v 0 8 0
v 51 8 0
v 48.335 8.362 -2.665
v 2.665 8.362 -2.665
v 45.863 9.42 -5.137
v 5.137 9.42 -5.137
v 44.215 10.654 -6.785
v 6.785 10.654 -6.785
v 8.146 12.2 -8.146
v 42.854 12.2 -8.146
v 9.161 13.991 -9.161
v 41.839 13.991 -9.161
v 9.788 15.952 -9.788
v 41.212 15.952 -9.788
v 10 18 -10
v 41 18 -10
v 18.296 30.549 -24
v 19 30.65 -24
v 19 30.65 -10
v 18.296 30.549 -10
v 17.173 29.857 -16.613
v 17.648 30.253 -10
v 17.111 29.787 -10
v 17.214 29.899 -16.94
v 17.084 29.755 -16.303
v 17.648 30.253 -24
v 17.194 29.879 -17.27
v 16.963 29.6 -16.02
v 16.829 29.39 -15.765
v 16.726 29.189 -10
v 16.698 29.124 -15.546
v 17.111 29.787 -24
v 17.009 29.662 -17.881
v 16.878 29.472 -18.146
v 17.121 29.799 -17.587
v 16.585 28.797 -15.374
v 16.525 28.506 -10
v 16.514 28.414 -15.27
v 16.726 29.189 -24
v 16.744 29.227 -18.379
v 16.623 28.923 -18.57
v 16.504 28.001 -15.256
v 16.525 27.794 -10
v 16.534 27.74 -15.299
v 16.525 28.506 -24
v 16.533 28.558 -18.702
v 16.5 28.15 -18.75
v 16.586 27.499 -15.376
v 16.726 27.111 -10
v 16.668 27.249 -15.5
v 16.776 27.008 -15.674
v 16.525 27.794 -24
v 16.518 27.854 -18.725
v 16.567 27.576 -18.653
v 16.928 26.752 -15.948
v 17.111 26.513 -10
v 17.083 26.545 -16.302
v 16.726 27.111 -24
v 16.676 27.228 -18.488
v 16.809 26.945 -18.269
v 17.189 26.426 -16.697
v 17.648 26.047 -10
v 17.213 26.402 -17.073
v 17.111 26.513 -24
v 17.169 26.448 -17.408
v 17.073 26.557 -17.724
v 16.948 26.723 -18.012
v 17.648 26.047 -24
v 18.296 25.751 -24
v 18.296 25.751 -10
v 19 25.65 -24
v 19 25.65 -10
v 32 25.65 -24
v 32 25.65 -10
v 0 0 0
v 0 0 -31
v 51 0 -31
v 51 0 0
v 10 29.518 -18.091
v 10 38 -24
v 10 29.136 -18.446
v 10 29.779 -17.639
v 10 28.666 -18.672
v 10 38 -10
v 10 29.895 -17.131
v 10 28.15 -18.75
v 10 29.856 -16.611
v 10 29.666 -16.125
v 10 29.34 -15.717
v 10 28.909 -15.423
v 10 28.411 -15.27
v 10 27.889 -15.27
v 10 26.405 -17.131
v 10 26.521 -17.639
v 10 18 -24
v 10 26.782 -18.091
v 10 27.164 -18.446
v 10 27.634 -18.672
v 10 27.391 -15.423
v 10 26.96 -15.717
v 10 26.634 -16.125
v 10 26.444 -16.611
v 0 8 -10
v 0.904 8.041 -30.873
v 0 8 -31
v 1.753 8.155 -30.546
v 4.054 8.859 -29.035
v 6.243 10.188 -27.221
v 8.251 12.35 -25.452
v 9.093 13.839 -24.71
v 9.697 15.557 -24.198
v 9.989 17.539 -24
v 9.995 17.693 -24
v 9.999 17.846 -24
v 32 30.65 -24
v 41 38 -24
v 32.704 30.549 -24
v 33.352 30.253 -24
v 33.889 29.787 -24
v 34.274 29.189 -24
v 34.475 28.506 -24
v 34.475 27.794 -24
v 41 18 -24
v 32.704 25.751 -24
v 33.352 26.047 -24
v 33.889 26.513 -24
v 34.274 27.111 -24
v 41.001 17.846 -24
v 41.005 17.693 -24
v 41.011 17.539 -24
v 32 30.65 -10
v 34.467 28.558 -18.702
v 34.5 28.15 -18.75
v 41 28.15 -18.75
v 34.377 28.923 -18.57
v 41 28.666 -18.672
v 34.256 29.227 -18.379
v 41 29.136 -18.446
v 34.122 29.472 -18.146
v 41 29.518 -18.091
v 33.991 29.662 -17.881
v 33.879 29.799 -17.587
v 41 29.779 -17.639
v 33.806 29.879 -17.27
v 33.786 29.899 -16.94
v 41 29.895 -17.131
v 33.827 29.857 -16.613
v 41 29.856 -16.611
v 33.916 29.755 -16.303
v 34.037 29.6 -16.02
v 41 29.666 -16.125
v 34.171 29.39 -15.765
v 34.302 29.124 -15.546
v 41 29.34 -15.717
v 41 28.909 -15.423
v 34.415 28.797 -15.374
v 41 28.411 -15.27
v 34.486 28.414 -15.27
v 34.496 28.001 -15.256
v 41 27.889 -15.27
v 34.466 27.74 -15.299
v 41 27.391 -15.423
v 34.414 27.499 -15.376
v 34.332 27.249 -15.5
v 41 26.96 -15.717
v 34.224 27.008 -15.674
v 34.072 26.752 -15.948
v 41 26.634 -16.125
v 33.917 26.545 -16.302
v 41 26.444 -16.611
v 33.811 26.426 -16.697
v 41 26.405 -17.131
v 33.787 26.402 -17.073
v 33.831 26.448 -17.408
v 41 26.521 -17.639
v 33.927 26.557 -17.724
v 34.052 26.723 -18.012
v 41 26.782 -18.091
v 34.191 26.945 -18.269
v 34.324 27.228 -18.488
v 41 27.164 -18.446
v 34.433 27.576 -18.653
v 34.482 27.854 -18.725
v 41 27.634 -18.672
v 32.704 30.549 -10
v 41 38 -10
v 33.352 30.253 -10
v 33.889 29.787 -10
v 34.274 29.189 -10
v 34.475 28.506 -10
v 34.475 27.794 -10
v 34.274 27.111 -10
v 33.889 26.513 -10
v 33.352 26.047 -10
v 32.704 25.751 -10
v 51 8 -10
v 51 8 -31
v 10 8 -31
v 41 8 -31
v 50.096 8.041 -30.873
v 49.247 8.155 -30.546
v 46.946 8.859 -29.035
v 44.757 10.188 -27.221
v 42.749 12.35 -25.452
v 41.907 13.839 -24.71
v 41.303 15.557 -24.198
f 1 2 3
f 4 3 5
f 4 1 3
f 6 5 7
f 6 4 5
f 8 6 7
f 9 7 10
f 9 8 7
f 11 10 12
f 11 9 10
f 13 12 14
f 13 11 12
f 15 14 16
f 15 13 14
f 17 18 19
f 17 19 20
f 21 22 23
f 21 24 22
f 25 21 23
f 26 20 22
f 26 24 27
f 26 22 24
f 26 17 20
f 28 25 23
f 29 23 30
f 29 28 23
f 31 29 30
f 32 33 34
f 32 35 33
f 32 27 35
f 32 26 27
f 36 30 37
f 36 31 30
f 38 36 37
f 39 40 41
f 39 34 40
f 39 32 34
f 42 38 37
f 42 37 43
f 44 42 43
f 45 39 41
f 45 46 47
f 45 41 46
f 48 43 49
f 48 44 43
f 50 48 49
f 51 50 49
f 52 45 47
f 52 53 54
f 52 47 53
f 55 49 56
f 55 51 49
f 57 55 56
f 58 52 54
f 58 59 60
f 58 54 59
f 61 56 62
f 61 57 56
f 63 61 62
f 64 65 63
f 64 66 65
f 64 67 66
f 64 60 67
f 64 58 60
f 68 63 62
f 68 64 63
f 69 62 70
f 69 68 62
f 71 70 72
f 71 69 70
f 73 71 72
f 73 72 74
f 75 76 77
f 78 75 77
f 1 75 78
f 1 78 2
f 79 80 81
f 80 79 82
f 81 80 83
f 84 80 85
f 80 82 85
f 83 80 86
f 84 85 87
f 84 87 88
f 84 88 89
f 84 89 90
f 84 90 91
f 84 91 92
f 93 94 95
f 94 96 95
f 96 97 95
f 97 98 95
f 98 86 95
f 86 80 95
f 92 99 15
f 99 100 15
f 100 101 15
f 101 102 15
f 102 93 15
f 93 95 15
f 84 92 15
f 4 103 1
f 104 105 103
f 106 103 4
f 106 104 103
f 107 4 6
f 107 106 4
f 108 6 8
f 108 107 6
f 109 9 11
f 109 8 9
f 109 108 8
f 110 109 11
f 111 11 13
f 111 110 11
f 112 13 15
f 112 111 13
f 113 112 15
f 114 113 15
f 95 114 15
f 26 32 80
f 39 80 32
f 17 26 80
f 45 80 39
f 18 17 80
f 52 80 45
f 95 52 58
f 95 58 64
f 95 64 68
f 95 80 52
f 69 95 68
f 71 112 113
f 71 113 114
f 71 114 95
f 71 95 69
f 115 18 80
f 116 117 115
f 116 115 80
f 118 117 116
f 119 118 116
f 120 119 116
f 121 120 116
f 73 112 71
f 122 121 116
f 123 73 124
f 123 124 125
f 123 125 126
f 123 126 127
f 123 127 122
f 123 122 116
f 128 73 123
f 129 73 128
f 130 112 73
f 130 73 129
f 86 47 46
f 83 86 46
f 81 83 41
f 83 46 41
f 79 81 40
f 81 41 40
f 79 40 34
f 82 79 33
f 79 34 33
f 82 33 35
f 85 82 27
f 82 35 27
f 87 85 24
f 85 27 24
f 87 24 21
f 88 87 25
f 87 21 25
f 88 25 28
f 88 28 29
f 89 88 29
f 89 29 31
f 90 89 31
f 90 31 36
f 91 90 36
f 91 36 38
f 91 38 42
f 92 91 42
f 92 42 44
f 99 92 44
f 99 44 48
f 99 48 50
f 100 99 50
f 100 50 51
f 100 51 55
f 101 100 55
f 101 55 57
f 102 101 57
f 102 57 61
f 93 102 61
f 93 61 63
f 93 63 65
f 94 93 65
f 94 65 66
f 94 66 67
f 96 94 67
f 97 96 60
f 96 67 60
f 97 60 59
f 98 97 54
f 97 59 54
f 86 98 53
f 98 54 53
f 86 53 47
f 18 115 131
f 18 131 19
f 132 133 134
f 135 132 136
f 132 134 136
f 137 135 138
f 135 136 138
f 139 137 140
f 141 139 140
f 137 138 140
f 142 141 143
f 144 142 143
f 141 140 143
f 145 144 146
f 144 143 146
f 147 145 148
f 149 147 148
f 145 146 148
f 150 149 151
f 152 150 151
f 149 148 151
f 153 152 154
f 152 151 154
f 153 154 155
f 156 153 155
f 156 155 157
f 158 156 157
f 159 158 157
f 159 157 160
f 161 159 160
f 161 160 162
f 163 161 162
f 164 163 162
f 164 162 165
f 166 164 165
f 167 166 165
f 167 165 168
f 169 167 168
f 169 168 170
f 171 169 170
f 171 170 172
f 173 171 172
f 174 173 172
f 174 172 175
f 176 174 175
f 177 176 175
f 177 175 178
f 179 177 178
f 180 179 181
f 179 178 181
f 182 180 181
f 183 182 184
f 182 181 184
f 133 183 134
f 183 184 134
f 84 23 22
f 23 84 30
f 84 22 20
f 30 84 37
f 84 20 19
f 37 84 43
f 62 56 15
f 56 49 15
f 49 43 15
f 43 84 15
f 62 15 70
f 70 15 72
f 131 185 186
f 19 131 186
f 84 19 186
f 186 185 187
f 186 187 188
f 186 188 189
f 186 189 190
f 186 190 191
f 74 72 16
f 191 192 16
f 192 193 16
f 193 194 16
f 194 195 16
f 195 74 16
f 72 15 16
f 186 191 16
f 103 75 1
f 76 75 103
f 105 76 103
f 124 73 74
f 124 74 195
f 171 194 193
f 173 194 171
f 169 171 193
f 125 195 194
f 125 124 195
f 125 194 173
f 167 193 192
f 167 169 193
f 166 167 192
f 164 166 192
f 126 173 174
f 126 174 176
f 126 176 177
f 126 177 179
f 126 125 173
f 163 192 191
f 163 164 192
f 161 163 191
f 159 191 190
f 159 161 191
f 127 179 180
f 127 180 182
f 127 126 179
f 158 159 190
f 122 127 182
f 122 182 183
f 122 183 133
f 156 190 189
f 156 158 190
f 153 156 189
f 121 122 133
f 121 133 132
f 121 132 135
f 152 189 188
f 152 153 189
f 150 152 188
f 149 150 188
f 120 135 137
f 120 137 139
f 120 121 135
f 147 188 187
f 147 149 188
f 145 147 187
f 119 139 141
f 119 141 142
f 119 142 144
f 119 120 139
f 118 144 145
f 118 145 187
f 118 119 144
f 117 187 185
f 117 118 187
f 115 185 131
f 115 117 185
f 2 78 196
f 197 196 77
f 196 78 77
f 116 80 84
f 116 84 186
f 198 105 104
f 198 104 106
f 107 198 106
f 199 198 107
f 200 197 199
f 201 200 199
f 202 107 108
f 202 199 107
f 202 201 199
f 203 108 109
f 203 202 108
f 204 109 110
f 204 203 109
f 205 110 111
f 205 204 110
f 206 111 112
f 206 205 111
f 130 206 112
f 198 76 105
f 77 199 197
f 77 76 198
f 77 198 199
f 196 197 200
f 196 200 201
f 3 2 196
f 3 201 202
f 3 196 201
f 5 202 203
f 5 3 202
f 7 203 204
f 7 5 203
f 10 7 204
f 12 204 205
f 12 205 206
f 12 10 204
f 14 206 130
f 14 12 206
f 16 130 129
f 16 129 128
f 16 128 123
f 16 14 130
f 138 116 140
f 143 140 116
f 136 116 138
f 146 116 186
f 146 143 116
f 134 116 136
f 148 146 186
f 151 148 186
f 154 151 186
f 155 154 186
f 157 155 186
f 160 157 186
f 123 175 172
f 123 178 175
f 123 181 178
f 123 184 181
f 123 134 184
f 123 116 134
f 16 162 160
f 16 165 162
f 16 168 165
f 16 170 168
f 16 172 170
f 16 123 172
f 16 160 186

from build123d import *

# Parameters (mm, degrees)
SKETCH1_W                               = 51
SKETCH1_H                               = 31
BOSS_EXTRUDE1_DEPTH                     = 8
SKETCH5_W                               = 31
SKETCH5_H                               = 14
BOSS_EXTRUDE3_DEPTH                     = 30
CUT_EXTRUDE3_DEPTH                      = 68.977937597
FILLET1_R                               = 10
SKETCH8_R                               = 1.75
F_3_5MM_SCREW_HOLE_FOR_TENSIONING_DEPTH = 64.921827371


with BuildPart() as part:
    # Sketch1 → Boss-Extrude1 (new body)
    with BuildSketch(Plane(origin=(0, 0, 0), x_dir=(1, 0, 0), z_dir=(0, 1, 0))):
        with Locations((25.5, 15.5)):
            Rectangle(SKETCH1_W, SKETCH1_H)
    extrude(amount=BOSS_EXTRUDE1_DEPTH)

    # Sketch5 → Boss-Extrude3 (add)
    with BuildSketch(Plane(origin=(0, 8, 0), x_dir=(1, 0, 0), z_dir=(0, 1, 0))):
        with Locations((25.5, 17)):
            Rectangle(SKETCH5_W, SKETCH5_H)
    extrude(amount=BOSS_EXTRUDE3_DEPTH)

    # Sketch6 → Cut-Extrude3 (cut, through all)
    with BuildSketch(Plane(origin=(0, 0, -24), x_dir=(-1, 0, 0), z_dir=(0, 0, -1))):
        with BuildLine():
            Line((-32.000000097, 30.65), (-18.999999903, 30.65))
            ThreePointArc((-18.999999903, 30.65), (-16.499999903, 28.15), (-18.999999903, 25.65))
            Line((-18.999999903, 25.65), (-32.000000097, 25.65))
            ThreePointArc((-32.000000097, 25.65), (-34.500000097, 28.15), (-32.000000097, 30.65))
        make_face()
    extrude(amount=-CUT_EXTRUDE3_DEPTH, mode=Mode.SUBTRACT)

    # Fillet1
    # the kernel refuses this fillet: 10 mm, written as the material it adds along each edge
    with BuildSketch(Plane(origin=(41, 8, -24), x_dir=(0, 0, -1), z_dir=(-1, 0, 0))) as fillet1_piece_1:
        with BuildLine():
            CenterArc((10, -9.539392014), FILLET1_R, 107.457603124, 72.542396876)
            Line((0, -9.539392014), (-0.2, -9.539392014))
            Line((-0.2, -9.539392014), (-0.2, 0))
            Line((-0.2, 0), (0, 0.2))
            ThreePointArc((0, 0.2), (3.5, 0.2), (6.94, 0.19078784))
            Line((6.94, 0.19078784), (7, 0))
        make_face()
    extrude(amount=31)
    with BuildSketch(Plane(origin=(10, 8, -24), x_dir=(-1, 0, 0), z_dir=(0, 0, 1)), Plane(origin=(41, 8, -10), x_dir=(1, 0, 0), z_dir=(0, 0, -1))) as fillet1_piece_2:
        with BuildLine():
            CenterArc((FILLET1_R, -FILLET1_R), FILLET1_R, 90, 90)
            Line((0, -FILLET1_R), (-FILLET1_R * 0.02, -FILLET1_R))
            Line((-FILLET1_R * 0.02, -FILLET1_R), (-FILLET1_R * 0.02, FILLET1_R * 0.02))
            Line((-FILLET1_R * 0.02, FILLET1_R * 0.02), (FILLET1_R, FILLET1_R * 0.02))
            Line((FILLET1_R, FILLET1_R * 0.02), (FILLET1_R, 0))
        make_face()
    extrude(amount=14)
    with BuildSketch(Plane(origin=(10, 8, -10), x_dir=(0, 0, 1), z_dir=(1, 0, 0))) as fillet1_piece_3:
        with BuildLine():
            CenterArc((FILLET1_R, -FILLET1_R), FILLET1_R, 90, 90)
            Line((0, -FILLET1_R), (-FILLET1_R * 0.02, -FILLET1_R))
            Line((-FILLET1_R * 0.02, -FILLET1_R), (-FILLET1_R * 0.02, FILLET1_R * 0.02))
            Line((-FILLET1_R * 0.02, FILLET1_R * 0.02), (FILLET1_R, FILLET1_R * 0.02))
            Line((FILLET1_R, FILLET1_R * 0.02), (FILLET1_R, 0))
        make_face()
    extrude(amount=31)
    with BuildSketch(Plane(origin=(64.848480035, 8, -24), x_dir=(0, 0, -1), z_dir=(-1, 0, 0))) as fillet1_piece_4a_section:
        with BuildLine():
            CenterArc((10, -9.539392014), FILLET1_R, 107.457603124, 72.542396876)
            Line((0, -9.539392014), (-0.2, -9.539392014))
            Line((-0.2, -9.539392014), (-0.2, 0))
            Line((-0.2, 0), (0, 0.2))
            ThreePointArc((0, 0.2), (3.5, 0.2), (6.94, 0.19078784))
            Line((6.94, 0.19078784), (7, 0))
        make_face()
    fillet1_piece_4a = extrude(amount=54.848480035, mode=Mode.PRIVATE)
    fillet1_piece_4a = split(fillet1_piece_4a, bisect_by=Plane(origin=(51, 10.271225878, -25.787817996), z_dir=(-1, 0, 0)), keep=Keep.TOP, mode=Mode.PRIVATE)
    fillet1_piece_4a = split(fillet1_piece_4a, bisect_by=Plane(origin=(41, 10.271225878, -25.787817996), z_dir=(1, 0, 0)), keep=Keep.TOP, mode=Mode.PRIVATE)
    with BuildSketch(Plane(origin=(41, 8, -10), x_dir=(1, 0, 0), z_dir=(0, 0, -1))) as fillet1_piece_4b_section:
        with BuildLine():
            CenterArc((FILLET1_R, -FILLET1_R), FILLET1_R, 90, 90)
            Line((0, -FILLET1_R), (-FILLET1_R * 0.02, -FILLET1_R))
            Line((-FILLET1_R * 0.02, -FILLET1_R), (-FILLET1_R * 0.02, FILLET1_R * 0.02))
            Line((-FILLET1_R * 0.02, FILLET1_R * 0.02), (FILLET1_R, FILLET1_R * 0.02))
            Line((FILLET1_R, FILLET1_R * 0.02), (FILLET1_R, 0))
        make_face()
    fillet1_piece_4b = extrude(amount=39, mode=Mode.PRIVATE)
    fillet1_piece_4b = split(fillet1_piece_4b, bisect_by=Plane(origin=(43.263951143, 10.263951143, -31), z_dir=(0, 0, 1)), keep=Keep.TOP, mode=Mode.PRIVATE)
    fillet1_piece_4b = split(fillet1_piece_4b, bisect_by=Plane(origin=(43.263951143, 10.263951143, -24), z_dir=(0, 0, -1)), keep=Keep.TOP, mode=Mode.PRIVATE)
    fillet1_piece_4 = fillet1_piece_4a & fillet1_piece_4b
    add(fillet1_piece_4)
    with BuildSketch(Plane(origin=(41, 8, -24), x_dir=(0, 0, -1), z_dir=(-1, 0, 0))) as fillet1_piece_5a_section:
        with BuildLine():
            CenterArc((10, -9.539392014), FILLET1_R, 107.457603124, 72.542396876)
            Line((0, -9.539392014), (-0.2, -9.539392014))
            Line((-0.2, -9.539392014), (-0.2, 0))
            Line((-0.2, 0), (0, 0.2))
            ThreePointArc((0, 0.2), (3.5, 0.2), (6.94, 0.19078784))
            Line((6.94, 0.19078784), (7, 0))
        make_face()
    fillet1_piece_5a = extrude(amount=54.848480035, mode=Mode.PRIVATE)
    fillet1_piece_5a = split(fillet1_piece_5a, bisect_by=Plane(origin=(0, 10.271225878, -25.787817996), z_dir=(1, 0, 0)), keep=Keep.TOP, mode=Mode.PRIVATE)
    fillet1_piece_5a = split(fillet1_piece_5a, bisect_by=Plane(origin=(10, 10.271225878, -25.787817996), z_dir=(-1, 0, 0)), keep=Keep.TOP, mode=Mode.PRIVATE)
    with BuildSketch(Plane(origin=(10, 8, -49), x_dir=(-1, 0, 0), z_dir=(0, 0, 1))) as fillet1_piece_5b_section:
        with BuildLine():
            CenterArc((FILLET1_R, -FILLET1_R), FILLET1_R, 90, 90)
            Line((0, -FILLET1_R), (-FILLET1_R * 0.02, -FILLET1_R))
            Line((-FILLET1_R * 0.02, -FILLET1_R), (-FILLET1_R * 0.02, FILLET1_R * 0.02))
            Line((-FILLET1_R * 0.02, FILLET1_R * 0.02), (FILLET1_R, FILLET1_R * 0.02))
            Line((FILLET1_R, FILLET1_R * 0.02), (FILLET1_R, 0))
        make_face()
    fillet1_piece_5b = extrude(amount=39, mode=Mode.PRIVATE)
    fillet1_piece_5b = split(fillet1_piece_5b, bisect_by=Plane(origin=(7.736048857, 10.263951143, -31), z_dir=(0, 0, 1)), keep=Keep.TOP, mode=Mode.PRIVATE)
    fillet1_piece_5b = split(fillet1_piece_5b, bisect_by=Plane(origin=(7.736048857, 10.263951143, -24), z_dir=(0, 0, -1)), keep=Keep.TOP, mode=Mode.PRIVATE)
    fillet1_piece_5 = fillet1_piece_5a & fillet1_piece_5b
    add(fillet1_piece_5)
    with BuildSketch(Plane(origin=(10, 8, -24), x_dir=(-1, 0, 0), z_dir=(0, 0, 1))) as fillet1_piece_6a_section:
        with BuildLine():
            CenterArc((FILLET1_R, -FILLET1_R), FILLET1_R, 90, 90)
            Line((0, -FILLET1_R), (-FILLET1_R * 0.02, -FILLET1_R))
            Line((-FILLET1_R * 0.02, -FILLET1_R), (-FILLET1_R * 0.02, FILLET1_R * 0.02))
            Line((-FILLET1_R * 0.02, FILLET1_R * 0.02), (FILLET1_R, FILLET1_R * 0.02))
            Line((FILLET1_R, FILLET1_R * 0.02), (FILLET1_R, 0))
        make_face()
    fillet1_piece_6a = extrude(amount=39, mode=Mode.PRIVATE)
    fillet1_piece_6a = split(fillet1_piece_6a, bisect_by=Plane(origin=(7.736048857, 10.263951143, 0), z_dir=(0, 0, -1)), keep=Keep.TOP, mode=Mode.PRIVATE)
    fillet1_piece_6a = split(fillet1_piece_6a, bisect_by=Plane(origin=(7.736048857, 10.263951143, -10), z_dir=(0, 0, 1)), keep=Keep.TOP, mode=Mode.PRIVATE)
    with BuildSketch(Plane(origin=(-15, 8, -10), x_dir=(0, 0, 1), z_dir=(1, 0, 0))) as fillet1_piece_6b_section:
        with BuildLine():
            CenterArc((FILLET1_R, -FILLET1_R), FILLET1_R, 90, 90)
            Line((0, -FILLET1_R), (-FILLET1_R * 0.02, -FILLET1_R))
            Line((-FILLET1_R * 0.02, -FILLET1_R), (-FILLET1_R * 0.02, FILLET1_R * 0.02))
            Line((-FILLET1_R * 0.02, FILLET1_R * 0.02), (FILLET1_R, FILLET1_R * 0.02))
            Line((FILLET1_R, FILLET1_R * 0.02), (FILLET1_R, 0))
        make_face()
    fillet1_piece_6b = extrude(amount=56, mode=Mode.PRIVATE)
    fillet1_piece_6b = split(fillet1_piece_6b, bisect_by=Plane(origin=(0, 10.263951143, -7.736048857), z_dir=(1, 0, 0)), keep=Keep.TOP, mode=Mode.PRIVATE)
    fillet1_piece_6b = split(fillet1_piece_6b, bisect_by=Plane(origin=(10, 10.263951143, -7.736048857), z_dir=(-1, 0, 0)), keep=Keep.TOP, mode=Mode.PRIVATE)
    fillet1_piece_6 = fillet1_piece_6a & fillet1_piece_6b
    add(fillet1_piece_6)
    with BuildSketch(Plane(origin=(10, 8, -10), x_dir=(0, 0, 1), z_dir=(1, 0, 0))) as fillet1_piece_7a_section:
        with BuildLine():
            CenterArc((FILLET1_R, -FILLET1_R), FILLET1_R, 90, 90)
            Line((0, -FILLET1_R), (-FILLET1_R * 0.02, -FILLET1_R))
            Line((-FILLET1_R * 0.02, -FILLET1_R), (-FILLET1_R * 0.02, FILLET1_R * 0.02))
            Line((-FILLET1_R * 0.02, FILLET1_R * 0.02), (FILLET1_R, FILLET1_R * 0.02))
            Line((FILLET1_R, FILLET1_R * 0.02), (FILLET1_R, 0))
        make_face()
    fillet1_piece_7a = extrude(amount=56, mode=Mode.PRIVATE)
    fillet1_piece_7a = split(fillet1_piece_7a, bisect_by=Plane(origin=(51, 10.263951143, -7.736048857), z_dir=(-1, 0, 0)), keep=Keep.TOP, mode=Mode.PRIVATE)
    fillet1_piece_7a = split(fillet1_piece_7a, bisect_by=Plane(origin=(41, 10.263951143, -7.736048857), z_dir=(1, 0, 0)), keep=Keep.TOP, mode=Mode.PRIVATE)
    with BuildSketch(Plane(origin=(41, 8, 15), x_dir=(1, 0, 0), z_dir=(0, 0, -1))) as fillet1_piece_7b_section:
        with BuildLine():
            CenterArc((FILLET1_R, -FILLET1_R), FILLET1_R, 90, 90)
            Line((0, -FILLET1_R), (-FILLET1_R * 0.02, -FILLET1_R))
            Line((-FILLET1_R * 0.02, -FILLET1_R), (-FILLET1_R * 0.02, FILLET1_R * 0.02))
            Line((-FILLET1_R * 0.02, FILLET1_R * 0.02), (FILLET1_R, FILLET1_R * 0.02))
            Line((FILLET1_R, FILLET1_R * 0.02), (FILLET1_R, 0))
        make_face()
    fillet1_piece_7b = extrude(amount=39, mode=Mode.PRIVATE)
    fillet1_piece_7b = split(fillet1_piece_7b, bisect_by=Plane(origin=(43.263951143, 10.263951143, 0), z_dir=(0, 0, -1)), keep=Keep.TOP, mode=Mode.PRIVATE)
    fillet1_piece_7b = split(fillet1_piece_7b, bisect_by=Plane(origin=(43.263951143, 10.263951143, -10), z_dir=(0, 0, 1)), keep=Keep.TOP, mode=Mode.PRIVATE)
    fillet1_piece_7 = fillet1_piece_7a & fillet1_piece_7b
    add(fillet1_piece_7)

    # Sketch8 → 3.5mm screw hole for tensioning (cut, through all)
    with BuildSketch(Plane(origin=(41, 0, 0), x_dir=(0, 0, -1), z_dir=(1, 0, 0))):
        with Locations((17, 28.15)):
            Circle(SKETCH8_R)
    extrude(amount=-F_3_5MM_SCREW_HOLE_FOR_TENSIONING_DEPTH, mode=Mode.SUBTRACT)


solid = part.part
